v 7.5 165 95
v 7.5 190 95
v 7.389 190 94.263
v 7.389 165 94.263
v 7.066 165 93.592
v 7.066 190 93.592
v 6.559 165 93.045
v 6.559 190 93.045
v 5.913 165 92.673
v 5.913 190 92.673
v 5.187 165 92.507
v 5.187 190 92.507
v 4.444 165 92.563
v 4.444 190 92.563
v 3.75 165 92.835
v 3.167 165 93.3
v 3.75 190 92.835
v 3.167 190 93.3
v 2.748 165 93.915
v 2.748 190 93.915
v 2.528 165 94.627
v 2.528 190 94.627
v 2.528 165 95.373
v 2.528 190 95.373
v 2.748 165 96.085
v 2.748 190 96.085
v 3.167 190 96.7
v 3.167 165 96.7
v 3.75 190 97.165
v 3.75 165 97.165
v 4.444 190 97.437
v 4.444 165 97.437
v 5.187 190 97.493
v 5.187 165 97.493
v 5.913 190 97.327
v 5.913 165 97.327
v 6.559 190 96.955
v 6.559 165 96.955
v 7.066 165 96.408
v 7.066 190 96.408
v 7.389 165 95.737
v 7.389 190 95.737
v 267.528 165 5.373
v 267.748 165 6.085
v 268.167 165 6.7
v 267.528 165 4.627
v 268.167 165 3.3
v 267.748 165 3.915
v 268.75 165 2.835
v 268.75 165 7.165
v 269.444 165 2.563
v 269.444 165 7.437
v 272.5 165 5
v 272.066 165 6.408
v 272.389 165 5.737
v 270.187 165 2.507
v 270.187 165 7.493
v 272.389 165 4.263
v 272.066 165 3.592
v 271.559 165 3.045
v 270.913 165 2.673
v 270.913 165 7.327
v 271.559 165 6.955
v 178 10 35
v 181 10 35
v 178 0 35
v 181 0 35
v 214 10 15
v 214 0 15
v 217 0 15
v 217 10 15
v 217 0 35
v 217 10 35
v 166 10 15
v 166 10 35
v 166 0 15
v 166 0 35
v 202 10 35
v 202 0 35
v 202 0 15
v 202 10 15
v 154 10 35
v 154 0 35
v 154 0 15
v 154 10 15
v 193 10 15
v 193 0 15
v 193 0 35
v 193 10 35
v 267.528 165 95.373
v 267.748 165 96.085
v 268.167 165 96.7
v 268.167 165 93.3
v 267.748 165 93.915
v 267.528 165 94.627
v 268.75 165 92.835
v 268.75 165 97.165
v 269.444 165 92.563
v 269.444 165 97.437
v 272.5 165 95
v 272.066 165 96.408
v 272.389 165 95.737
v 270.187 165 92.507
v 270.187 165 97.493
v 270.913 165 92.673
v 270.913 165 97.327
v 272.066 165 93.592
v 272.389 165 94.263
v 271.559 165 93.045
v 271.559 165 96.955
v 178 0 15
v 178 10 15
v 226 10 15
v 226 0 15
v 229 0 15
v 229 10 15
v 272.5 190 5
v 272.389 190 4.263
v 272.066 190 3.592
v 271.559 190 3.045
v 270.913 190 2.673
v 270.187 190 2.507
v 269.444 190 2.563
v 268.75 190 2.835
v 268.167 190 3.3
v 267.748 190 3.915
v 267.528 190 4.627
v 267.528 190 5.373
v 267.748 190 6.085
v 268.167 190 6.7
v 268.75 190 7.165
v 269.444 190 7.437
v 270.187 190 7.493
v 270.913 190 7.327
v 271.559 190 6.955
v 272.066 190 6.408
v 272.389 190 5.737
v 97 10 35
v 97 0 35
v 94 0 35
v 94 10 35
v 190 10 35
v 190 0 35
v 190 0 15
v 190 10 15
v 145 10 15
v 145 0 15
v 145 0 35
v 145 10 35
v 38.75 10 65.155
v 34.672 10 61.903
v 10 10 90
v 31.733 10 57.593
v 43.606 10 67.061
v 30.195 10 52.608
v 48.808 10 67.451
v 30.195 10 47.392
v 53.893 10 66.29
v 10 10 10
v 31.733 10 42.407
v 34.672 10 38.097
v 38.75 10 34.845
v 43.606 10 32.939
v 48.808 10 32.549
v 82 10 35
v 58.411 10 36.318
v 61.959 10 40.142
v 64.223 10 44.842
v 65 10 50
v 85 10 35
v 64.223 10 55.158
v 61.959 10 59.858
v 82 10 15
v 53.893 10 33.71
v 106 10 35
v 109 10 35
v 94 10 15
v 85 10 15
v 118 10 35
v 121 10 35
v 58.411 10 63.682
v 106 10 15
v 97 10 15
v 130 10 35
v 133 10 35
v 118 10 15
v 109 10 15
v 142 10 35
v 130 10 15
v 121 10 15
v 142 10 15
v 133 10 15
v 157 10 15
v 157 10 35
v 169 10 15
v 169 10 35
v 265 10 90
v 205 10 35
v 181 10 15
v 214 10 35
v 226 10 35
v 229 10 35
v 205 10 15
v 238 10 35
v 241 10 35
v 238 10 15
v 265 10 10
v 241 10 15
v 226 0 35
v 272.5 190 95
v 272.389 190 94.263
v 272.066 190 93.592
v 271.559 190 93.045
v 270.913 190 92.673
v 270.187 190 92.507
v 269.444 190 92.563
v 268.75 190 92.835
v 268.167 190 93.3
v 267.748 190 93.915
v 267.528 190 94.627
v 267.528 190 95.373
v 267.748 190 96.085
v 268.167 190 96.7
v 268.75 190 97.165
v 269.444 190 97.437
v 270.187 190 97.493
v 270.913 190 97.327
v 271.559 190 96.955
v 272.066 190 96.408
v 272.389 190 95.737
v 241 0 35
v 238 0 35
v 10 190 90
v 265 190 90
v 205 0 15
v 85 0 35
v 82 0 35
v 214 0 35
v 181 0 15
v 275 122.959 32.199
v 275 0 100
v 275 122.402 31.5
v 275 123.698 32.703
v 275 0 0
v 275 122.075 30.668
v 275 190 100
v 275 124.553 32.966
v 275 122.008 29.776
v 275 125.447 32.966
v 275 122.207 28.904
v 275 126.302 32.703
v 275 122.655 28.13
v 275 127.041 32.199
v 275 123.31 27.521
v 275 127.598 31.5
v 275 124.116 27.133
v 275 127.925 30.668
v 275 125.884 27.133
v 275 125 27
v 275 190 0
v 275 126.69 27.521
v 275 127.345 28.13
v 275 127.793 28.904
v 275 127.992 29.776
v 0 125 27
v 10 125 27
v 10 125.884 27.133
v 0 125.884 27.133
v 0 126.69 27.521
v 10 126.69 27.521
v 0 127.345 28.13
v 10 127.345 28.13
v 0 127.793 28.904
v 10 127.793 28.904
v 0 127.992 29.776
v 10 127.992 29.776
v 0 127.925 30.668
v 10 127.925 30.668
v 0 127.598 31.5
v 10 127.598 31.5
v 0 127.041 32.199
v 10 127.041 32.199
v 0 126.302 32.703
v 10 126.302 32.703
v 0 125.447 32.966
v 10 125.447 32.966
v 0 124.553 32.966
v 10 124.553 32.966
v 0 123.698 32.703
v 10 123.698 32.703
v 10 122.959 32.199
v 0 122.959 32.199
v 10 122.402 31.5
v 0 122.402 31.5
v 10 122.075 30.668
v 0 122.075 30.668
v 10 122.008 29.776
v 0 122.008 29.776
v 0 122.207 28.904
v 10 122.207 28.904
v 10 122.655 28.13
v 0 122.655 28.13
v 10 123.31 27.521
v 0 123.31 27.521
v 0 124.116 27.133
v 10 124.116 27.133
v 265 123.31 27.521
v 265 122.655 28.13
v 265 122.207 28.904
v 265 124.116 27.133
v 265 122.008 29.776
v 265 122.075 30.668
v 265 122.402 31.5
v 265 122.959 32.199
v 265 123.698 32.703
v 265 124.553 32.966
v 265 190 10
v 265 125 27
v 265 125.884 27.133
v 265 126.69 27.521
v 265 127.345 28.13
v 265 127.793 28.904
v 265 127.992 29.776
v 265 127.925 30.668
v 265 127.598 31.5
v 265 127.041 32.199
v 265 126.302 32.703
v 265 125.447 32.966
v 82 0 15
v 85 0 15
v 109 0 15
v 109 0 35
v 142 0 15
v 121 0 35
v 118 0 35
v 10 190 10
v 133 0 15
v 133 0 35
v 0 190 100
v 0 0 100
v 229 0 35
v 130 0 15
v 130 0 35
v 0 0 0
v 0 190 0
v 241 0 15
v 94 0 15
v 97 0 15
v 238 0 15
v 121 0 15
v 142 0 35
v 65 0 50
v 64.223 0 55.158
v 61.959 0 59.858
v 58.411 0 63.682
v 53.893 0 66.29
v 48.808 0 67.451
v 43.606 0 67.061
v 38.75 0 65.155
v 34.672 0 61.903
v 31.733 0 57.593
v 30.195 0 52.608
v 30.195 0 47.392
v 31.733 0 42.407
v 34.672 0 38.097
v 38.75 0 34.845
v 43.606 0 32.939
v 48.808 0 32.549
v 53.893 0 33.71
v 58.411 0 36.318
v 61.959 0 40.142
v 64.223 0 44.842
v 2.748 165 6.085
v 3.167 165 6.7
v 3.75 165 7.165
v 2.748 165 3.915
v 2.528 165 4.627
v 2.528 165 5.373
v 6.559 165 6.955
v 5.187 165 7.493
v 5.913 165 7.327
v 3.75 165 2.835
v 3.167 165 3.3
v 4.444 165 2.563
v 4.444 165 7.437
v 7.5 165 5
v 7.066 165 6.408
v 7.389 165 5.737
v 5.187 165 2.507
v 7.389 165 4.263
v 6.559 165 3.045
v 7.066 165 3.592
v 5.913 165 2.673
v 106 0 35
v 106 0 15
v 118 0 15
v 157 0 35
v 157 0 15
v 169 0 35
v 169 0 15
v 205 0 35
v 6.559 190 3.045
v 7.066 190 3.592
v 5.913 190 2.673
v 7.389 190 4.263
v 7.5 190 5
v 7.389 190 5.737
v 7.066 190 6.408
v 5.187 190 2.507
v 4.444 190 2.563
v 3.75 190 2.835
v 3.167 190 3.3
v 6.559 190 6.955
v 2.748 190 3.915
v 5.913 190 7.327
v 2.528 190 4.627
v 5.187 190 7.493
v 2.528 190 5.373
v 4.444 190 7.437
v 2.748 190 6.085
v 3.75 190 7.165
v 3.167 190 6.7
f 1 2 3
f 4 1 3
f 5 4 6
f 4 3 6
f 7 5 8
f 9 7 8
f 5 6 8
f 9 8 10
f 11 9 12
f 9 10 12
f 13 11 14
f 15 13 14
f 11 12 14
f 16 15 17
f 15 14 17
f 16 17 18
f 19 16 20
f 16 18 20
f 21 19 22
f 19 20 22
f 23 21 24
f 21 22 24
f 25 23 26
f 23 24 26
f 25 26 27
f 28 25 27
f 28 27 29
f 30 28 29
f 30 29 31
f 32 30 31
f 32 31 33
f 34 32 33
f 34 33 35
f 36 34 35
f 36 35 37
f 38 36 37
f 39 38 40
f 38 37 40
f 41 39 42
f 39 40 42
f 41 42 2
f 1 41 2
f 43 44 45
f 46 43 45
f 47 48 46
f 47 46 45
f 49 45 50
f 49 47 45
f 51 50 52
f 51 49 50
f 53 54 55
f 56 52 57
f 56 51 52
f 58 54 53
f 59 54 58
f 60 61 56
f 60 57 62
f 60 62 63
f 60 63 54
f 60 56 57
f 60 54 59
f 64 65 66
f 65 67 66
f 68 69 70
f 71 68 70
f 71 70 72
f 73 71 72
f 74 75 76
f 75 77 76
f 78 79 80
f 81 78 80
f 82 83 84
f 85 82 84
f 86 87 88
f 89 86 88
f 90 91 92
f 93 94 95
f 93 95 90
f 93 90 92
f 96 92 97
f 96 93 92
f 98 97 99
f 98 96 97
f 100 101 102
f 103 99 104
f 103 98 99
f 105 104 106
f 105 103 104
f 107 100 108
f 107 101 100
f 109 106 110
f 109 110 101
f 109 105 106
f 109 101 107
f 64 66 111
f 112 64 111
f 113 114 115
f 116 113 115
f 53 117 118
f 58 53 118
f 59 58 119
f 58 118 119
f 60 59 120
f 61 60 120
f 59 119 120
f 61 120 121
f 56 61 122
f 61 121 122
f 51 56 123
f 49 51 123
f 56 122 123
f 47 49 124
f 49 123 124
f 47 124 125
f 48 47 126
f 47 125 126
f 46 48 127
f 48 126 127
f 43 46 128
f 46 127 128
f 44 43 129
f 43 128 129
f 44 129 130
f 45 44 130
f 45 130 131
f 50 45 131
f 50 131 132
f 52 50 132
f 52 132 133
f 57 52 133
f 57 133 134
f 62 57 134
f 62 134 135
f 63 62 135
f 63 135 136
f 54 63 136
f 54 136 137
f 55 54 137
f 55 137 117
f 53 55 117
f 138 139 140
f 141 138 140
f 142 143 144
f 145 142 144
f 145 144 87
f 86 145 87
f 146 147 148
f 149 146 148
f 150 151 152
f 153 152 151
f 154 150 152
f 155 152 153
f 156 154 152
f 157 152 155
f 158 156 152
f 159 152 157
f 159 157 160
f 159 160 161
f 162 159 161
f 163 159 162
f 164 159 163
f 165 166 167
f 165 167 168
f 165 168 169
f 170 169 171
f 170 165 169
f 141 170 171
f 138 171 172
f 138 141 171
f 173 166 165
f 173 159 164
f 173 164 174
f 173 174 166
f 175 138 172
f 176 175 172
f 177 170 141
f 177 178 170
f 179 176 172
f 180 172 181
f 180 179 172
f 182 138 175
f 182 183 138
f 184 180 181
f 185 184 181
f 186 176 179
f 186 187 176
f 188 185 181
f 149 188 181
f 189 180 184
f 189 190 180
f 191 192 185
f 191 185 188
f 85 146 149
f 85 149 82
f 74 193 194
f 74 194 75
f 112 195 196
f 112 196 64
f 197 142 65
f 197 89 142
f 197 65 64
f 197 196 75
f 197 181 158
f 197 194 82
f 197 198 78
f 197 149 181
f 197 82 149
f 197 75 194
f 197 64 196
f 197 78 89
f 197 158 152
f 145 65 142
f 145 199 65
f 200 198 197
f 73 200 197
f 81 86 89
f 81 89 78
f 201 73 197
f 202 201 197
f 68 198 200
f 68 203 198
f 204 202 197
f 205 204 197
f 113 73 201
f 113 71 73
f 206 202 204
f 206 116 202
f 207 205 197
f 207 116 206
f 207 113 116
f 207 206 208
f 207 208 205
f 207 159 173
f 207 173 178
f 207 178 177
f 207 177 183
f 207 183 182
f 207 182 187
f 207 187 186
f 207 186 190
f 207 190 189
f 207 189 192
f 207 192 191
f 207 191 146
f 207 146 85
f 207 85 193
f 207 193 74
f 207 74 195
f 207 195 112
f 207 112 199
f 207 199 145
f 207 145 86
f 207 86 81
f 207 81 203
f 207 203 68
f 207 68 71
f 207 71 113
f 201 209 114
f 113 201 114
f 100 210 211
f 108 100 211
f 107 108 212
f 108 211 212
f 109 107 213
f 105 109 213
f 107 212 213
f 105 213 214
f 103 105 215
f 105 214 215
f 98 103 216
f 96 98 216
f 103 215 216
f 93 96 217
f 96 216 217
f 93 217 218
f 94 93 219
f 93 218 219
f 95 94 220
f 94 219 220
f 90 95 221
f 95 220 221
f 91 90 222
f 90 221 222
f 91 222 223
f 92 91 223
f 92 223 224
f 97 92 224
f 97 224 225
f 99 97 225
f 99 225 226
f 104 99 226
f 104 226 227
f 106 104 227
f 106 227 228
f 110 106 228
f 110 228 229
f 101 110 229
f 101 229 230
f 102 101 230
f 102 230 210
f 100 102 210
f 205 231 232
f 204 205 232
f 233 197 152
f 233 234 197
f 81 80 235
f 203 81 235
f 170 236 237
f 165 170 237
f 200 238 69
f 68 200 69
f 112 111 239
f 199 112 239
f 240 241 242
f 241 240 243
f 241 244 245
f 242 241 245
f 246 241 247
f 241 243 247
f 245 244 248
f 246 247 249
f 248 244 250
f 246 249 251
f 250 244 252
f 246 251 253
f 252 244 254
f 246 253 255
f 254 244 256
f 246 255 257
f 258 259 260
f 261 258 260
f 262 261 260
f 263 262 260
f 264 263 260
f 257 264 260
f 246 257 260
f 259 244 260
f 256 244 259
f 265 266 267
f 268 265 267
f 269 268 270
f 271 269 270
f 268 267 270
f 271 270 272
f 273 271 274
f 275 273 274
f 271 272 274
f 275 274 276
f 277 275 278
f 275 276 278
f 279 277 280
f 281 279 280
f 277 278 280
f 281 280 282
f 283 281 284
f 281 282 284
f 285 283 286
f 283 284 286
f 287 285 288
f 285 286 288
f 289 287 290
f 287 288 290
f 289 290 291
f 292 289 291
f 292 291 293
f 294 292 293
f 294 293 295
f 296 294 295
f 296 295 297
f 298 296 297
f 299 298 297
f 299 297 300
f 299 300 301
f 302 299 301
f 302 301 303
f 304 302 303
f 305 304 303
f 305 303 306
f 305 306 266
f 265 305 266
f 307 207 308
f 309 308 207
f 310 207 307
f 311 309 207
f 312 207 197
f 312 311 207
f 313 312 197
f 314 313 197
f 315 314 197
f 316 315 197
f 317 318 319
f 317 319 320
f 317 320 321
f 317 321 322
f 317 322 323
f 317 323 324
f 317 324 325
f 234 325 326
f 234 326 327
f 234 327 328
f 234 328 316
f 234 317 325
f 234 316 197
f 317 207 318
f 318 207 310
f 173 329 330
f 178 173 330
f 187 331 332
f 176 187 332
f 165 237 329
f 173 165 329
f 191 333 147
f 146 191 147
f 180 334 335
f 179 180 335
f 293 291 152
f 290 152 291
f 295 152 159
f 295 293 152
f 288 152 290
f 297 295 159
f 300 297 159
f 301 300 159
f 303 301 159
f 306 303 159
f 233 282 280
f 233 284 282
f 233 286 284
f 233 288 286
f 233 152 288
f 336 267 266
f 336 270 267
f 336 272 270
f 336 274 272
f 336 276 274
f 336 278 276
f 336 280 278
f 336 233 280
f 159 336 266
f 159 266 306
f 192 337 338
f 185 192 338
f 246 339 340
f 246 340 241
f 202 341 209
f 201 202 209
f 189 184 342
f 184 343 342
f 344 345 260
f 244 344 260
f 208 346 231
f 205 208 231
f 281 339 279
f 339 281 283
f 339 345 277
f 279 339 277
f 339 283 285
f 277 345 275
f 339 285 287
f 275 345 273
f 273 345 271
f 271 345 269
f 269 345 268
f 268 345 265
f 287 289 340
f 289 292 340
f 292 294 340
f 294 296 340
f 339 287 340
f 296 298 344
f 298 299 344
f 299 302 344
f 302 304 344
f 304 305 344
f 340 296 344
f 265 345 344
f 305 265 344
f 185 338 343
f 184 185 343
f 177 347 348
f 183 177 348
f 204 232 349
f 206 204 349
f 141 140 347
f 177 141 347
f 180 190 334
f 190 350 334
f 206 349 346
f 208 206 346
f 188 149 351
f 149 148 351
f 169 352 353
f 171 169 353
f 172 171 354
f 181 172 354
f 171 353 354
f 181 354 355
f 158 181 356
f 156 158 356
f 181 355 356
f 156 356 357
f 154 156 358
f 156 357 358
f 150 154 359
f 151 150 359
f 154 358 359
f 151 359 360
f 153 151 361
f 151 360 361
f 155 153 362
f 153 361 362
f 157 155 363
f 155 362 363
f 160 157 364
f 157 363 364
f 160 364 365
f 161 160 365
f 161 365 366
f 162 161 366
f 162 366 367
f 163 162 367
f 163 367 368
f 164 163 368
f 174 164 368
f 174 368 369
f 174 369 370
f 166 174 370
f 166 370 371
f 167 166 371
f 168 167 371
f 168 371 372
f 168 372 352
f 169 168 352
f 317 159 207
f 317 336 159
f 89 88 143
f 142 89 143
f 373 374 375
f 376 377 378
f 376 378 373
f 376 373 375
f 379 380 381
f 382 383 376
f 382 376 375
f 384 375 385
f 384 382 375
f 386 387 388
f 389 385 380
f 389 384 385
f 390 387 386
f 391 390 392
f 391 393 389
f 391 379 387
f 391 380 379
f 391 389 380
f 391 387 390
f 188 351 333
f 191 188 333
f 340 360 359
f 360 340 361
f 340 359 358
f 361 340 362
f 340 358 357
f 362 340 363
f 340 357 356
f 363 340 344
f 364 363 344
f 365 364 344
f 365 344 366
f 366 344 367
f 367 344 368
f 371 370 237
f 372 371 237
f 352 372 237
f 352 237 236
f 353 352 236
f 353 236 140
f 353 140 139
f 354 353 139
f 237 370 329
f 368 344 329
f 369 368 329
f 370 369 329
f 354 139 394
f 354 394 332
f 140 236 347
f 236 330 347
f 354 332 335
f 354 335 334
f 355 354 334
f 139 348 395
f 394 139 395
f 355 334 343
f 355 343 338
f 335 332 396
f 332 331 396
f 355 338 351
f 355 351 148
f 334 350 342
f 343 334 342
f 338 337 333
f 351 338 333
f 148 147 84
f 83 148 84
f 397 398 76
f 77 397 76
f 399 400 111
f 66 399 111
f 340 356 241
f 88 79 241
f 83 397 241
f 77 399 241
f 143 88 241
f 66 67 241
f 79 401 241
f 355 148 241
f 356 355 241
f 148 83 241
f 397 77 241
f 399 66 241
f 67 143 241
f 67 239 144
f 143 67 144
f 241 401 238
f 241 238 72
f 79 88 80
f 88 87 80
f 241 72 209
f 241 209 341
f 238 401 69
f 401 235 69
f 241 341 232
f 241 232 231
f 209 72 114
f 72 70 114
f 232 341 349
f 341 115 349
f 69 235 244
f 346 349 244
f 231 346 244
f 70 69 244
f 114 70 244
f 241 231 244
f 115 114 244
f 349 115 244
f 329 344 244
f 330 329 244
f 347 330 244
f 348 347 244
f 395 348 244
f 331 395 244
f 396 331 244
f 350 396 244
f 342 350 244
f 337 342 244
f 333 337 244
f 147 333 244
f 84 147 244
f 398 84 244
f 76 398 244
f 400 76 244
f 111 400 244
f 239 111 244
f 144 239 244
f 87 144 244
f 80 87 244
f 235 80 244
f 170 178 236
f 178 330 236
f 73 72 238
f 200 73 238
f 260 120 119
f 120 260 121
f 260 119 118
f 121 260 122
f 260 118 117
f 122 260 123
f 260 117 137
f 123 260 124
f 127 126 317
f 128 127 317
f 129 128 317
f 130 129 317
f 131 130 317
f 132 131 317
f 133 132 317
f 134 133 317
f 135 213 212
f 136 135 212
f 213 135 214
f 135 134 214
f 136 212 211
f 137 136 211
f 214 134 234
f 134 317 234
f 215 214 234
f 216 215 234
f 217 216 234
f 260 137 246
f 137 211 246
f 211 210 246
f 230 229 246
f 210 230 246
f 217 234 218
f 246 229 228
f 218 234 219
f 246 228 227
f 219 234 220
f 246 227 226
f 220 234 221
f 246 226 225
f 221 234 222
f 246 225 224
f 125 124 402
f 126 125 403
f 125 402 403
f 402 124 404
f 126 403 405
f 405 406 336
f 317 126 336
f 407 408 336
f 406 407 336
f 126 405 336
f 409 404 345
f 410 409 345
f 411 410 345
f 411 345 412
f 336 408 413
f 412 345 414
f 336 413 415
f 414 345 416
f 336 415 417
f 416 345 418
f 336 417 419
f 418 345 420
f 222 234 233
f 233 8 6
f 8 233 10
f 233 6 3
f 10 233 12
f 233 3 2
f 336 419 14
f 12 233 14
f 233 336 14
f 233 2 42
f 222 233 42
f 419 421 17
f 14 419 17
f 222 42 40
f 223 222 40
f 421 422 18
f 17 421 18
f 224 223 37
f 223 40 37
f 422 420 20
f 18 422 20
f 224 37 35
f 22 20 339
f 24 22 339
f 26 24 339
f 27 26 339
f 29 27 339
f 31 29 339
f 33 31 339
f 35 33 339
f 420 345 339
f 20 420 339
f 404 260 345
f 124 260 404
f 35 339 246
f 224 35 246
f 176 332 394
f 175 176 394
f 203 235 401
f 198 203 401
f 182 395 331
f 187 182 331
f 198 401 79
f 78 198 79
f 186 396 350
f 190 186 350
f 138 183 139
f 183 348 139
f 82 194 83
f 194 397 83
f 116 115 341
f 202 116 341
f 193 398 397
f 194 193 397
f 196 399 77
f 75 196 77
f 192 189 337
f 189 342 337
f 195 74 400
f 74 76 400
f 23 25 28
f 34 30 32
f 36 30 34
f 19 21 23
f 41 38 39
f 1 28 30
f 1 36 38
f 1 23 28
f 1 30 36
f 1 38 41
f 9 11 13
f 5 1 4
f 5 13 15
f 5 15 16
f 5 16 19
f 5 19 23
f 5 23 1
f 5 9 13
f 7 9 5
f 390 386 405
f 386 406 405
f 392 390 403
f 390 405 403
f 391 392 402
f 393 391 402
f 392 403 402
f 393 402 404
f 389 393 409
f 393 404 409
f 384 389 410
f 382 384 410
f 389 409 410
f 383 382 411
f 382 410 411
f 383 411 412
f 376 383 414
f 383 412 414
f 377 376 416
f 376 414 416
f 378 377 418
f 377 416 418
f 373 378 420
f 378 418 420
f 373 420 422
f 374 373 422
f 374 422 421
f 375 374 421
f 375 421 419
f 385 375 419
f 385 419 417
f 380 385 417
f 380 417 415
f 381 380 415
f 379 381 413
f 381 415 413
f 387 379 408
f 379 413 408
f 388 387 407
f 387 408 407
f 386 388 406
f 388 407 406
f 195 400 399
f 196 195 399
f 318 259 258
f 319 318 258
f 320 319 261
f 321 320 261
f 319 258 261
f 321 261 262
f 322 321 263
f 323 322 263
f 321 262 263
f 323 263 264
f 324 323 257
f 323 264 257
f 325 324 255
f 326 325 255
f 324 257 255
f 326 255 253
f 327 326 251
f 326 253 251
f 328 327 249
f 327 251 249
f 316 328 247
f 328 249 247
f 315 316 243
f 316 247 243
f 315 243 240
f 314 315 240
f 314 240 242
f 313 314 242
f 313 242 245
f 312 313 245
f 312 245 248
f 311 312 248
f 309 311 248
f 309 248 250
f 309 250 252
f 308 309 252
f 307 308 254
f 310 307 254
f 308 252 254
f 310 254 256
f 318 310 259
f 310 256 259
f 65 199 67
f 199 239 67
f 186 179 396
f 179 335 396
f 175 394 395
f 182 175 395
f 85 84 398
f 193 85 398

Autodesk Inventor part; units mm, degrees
ref_plane "YZ Plane" through (0, 0, 0) normal (1, 0, 0) x (0, 1, 0)
ref_plane "XZ Plane" through (0, 0, 0) normal (0, 1, 0) x (-1, 0, 0)
ref_plane "XY Plane" through (0, 0, 0) normal (0, 0, 1) x (1, 0, 0)
sketch "Sketch1" plane through (0, 0, 0) normal (0, 0, 1) x (1, 0, 0)
  line L0 (0, 0) -> (275, 0)
  line L1 (275, 0) -> (275, 200)
  line L2 (275, 200) -> (0, 200)
  line L3 (0, 200) -> (0, 0)
  dimension "d0" = 275
  dimension "d1" = 200
extrude "Extrusion1" add sketch "Sketch1" along normal blind 20
sketch "Sketch3" plane through (0, 0, 20) normal (0, 0, 1) x (1, 0, 0)
  line L0 (275, 0) -> (275, 200) projected
  line L1 (0, 200) -> (275, 200)
  line L2 (275, 200) -> (275, 0)
  line L3 (275, 0) -> (0, 0)
  line L4 (0, 0) -> (0, 200)
  point P0 (0, 0)
extrude "Extrusion3" add sketch "Sketch3" along normal blind 80
sketch "Sketch4" plane through (0, 0, 0) normal (0, -1, 0) x (1, 0, 0)
  circle A0 centre (47.5, 50) radius 17.5
  circle A1 centre (227.5, 50) radius 17.5
  line L0 (47.5, 50) -> (227.5, 50) construction
  line L1 (0, 0) -> (0, 100) projected
  line L2 (0, 100) -> (275, 100) projected
  point P0 (0, 50)
  point P1 (137.5, 50)
  point P2 (137.5, 100)
  dimension "d10" = 35
  dimension "d11" = 35
  dimension "d12" = 180
extrude "Extrusion4" cut sketch "Sketch4" against normal blind 100 contours A0
sketch "Sketch5" plane through (0, 200, 0) normal (0, 1, 0) x (1, 0, 0)
  line L0 (275, 0) -> (0, 0) projected
  line L1 (0, 0) -> (0, -100) projected
  line L2 (275, -100) -> (0, -100) projected
  line L3 (275, 0) -> (275, -100) projected
  line L4 (265, -90) -> (10, -90)
  line L5 (10, -90) -> (10, -10)
  line L6 (10, -10) -> (265, -10)
  line L7 (265, -10) -> (265, -90)
  point P0 (0, 0)
  dimension "d15" = 10
extrude "Extrusion5" cut sketch "Sketch5" against normal blind 190 contours L4 L5 L6 L7
sketch "Sketch6" plane through (0, 0, 0) normal (-1, 0, 0) x (0, 0, 1)
  line L0 (0, 200) -> (100, 200) projected
  line L1 (0, 200) -> (0, 0) projected
  line L2 (100, 200) -> (0, 200)
  line L3 (0, 200) -> (0, 190)
  line L4 (0, 190) -> (100, 190)
  line L5 (100, 190) -> (100, 200)
  dimension "d18" = 10
extrude "Extrusion6" cut sketch "Sketch6" against normal through all
sketch "Sketch7" plane through (0, 190, 100) normal (0, 1, 0) x (1, 0, 0)
  line L0 (275, 100) -> (275, 0) construction
  line L1 (0, 100) -> (275, 100) construction
  line L2 (0, 0) -> (0, 100) construction
  line L3 (275, 0) -> (0, 0) construction
  line L4 (265, 10) -> (265, 90) construction
  line L5 (10, 10) -> (265, 10) construction
  line L6 (10, 90) -> (10, 10) construction
  line L7 (265, 90) -> (10, 90) construction
  line L8 (270, 5) -> (270, 95) construction
  line L9 (270, 95) -> (5, 95) construction
  line L10 (5, 95) -> (5, 5) construction
  line L11 (5, 5) -> (270, 5) construction
  circle A0 centre (270, 5) radius 2.5
  circle A1 centre (270, 95) radius 2.5
  circle A2 centre (5, 95) radius 2.5
  circle A3 centre (5, 5) radius 2.5
  point P0 (0, 100)
  dimension "d21" = 5
  dimension "d22" = 5
  dimension "d23" = 5
  dimension "d24" = 5
  dimension "d25" = 5
extrude "Extrusion7" cut sketch "Sketch7" against normal blind 25
sketch "Sketch8" plane through (0, 0, 0) normal (0, -1, 0) x (1, 0, 0)
  line L0 (82, 15) -> (85, 15)
  line L1 (85, 15) -> (85, 35)
  line L2 (85, 35) -> (82, 35)
  line L3 (82, 35) -> (82, 15)
  line L4 (0, 0) -> (0, 100) projected
  line L5 (0, 0) -> (275, 0) projected
  line L6 (97, 15) -> (97, 35)
  line L7 (97, 35) -> (94, 35)
  line L8 (94, 35) -> (94, 15)
  line L9 (94, 15) -> (97, 15)
  line L10 (109, 15) -> (109, 35)
  line L11 (109, 35) -> (106, 35)
  line L12 (106, 35) -> (106, 15)
  line L13 (106, 15) -> (109, 15)
  line L14 (121, 15) -> (121, 35)
  line L15 (121, 35) -> (118, 35)
  line L16 (118, 35) -> (118, 15)
  line L17 (118, 15) -> (121, 15)
  line L18 (133, 15) -> (133, 35)
  line L19 (133, 35) -> (130, 35)
  line L20 (130, 35) -> (130, 15)
  line L21 (130, 15) -> (133, 15)
  line L22 (145, 15) -> (145, 35)
  line L23 (145, 35) -> (142, 35)
  line L24 (142, 35) -> (142, 15)
  line L25 (142, 15) -> (145, 15)
  line L26 (157, 15) -> (157, 35)
  line L27 (157, 35) -> (154, 35)
  line L28 (154, 35) -> (154, 15)
  line L29 (154, 15) -> (157, 15)
  line L30 (169, 15) -> (169, 35)
  line L31 (169, 35) -> (166, 35)
  line L32 (166, 35) -> (166, 15)
  line L33 (166, 15) -> (169, 15)
  line L34 (181, 15) -> (181, 35)
  line L35 (181, 35) -> (178, 35)
  line L36 (178, 35) -> (178, 15)
  line L37 (178, 15) -> (181, 15)
  line L38 (193, 15) -> (193, 35)
  line L39 (193, 35) -> (190, 35)
  line L40 (190, 35) -> (190, 15)
  line L41 (190, 15) -> (193, 15)
  line L42 (205, 15) -> (205, 35)
  line L43 (205, 35) -> (202, 35)
  line L44 (202, 35) -> (202, 15)
  line L45 (202, 15) -> (205, 15)
  line L46 (217, 15) -> (217, 35)
  line L47 (217, 35) -> (214, 35)
  line L48 (214, 35) -> (214, 15)
  line L49 (214, 15) -> (217, 15)
  line L50 (229, 15) -> (229, 35)
  line L51 (229, 35) -> (226, 35)
  line L52 (226, 35) -> (226, 15)
  line L53 (226, 15) -> (229, 15)
  line L54 (241, 15) -> (241, 35)
  line L55 (241, 35) -> (238, 35)
  line L56 (238, 35) -> (238, 15)
  line L57 (238, 15) -> (241, 15)
  dimension "d28" = 3
  dimension "d29" = 20
  dimension "d30" = 82
  dimension "d31" = 15
  dimension "d34" = 12
extrude "Extrusion8" cut sketch "Sketch8" against normal through all
sketch "Sketch2" plane through (275, 0, 100) normal (1, 0, 0) x (0, 0, -1)
  circle A0 centre (70, 125) radius 3
  line L0 (100, 0) -> (0, 0) projected
  line L1 (100, 0) -> (100, 190) projected
  dimension "d4" = 6
  dimension "d45" = 125
  dimension "d46" = 30
extrude "Extrusion2" cut sketch "Sketch2" against normal through all
properties part number "HA005" material "ABS Plastic"
